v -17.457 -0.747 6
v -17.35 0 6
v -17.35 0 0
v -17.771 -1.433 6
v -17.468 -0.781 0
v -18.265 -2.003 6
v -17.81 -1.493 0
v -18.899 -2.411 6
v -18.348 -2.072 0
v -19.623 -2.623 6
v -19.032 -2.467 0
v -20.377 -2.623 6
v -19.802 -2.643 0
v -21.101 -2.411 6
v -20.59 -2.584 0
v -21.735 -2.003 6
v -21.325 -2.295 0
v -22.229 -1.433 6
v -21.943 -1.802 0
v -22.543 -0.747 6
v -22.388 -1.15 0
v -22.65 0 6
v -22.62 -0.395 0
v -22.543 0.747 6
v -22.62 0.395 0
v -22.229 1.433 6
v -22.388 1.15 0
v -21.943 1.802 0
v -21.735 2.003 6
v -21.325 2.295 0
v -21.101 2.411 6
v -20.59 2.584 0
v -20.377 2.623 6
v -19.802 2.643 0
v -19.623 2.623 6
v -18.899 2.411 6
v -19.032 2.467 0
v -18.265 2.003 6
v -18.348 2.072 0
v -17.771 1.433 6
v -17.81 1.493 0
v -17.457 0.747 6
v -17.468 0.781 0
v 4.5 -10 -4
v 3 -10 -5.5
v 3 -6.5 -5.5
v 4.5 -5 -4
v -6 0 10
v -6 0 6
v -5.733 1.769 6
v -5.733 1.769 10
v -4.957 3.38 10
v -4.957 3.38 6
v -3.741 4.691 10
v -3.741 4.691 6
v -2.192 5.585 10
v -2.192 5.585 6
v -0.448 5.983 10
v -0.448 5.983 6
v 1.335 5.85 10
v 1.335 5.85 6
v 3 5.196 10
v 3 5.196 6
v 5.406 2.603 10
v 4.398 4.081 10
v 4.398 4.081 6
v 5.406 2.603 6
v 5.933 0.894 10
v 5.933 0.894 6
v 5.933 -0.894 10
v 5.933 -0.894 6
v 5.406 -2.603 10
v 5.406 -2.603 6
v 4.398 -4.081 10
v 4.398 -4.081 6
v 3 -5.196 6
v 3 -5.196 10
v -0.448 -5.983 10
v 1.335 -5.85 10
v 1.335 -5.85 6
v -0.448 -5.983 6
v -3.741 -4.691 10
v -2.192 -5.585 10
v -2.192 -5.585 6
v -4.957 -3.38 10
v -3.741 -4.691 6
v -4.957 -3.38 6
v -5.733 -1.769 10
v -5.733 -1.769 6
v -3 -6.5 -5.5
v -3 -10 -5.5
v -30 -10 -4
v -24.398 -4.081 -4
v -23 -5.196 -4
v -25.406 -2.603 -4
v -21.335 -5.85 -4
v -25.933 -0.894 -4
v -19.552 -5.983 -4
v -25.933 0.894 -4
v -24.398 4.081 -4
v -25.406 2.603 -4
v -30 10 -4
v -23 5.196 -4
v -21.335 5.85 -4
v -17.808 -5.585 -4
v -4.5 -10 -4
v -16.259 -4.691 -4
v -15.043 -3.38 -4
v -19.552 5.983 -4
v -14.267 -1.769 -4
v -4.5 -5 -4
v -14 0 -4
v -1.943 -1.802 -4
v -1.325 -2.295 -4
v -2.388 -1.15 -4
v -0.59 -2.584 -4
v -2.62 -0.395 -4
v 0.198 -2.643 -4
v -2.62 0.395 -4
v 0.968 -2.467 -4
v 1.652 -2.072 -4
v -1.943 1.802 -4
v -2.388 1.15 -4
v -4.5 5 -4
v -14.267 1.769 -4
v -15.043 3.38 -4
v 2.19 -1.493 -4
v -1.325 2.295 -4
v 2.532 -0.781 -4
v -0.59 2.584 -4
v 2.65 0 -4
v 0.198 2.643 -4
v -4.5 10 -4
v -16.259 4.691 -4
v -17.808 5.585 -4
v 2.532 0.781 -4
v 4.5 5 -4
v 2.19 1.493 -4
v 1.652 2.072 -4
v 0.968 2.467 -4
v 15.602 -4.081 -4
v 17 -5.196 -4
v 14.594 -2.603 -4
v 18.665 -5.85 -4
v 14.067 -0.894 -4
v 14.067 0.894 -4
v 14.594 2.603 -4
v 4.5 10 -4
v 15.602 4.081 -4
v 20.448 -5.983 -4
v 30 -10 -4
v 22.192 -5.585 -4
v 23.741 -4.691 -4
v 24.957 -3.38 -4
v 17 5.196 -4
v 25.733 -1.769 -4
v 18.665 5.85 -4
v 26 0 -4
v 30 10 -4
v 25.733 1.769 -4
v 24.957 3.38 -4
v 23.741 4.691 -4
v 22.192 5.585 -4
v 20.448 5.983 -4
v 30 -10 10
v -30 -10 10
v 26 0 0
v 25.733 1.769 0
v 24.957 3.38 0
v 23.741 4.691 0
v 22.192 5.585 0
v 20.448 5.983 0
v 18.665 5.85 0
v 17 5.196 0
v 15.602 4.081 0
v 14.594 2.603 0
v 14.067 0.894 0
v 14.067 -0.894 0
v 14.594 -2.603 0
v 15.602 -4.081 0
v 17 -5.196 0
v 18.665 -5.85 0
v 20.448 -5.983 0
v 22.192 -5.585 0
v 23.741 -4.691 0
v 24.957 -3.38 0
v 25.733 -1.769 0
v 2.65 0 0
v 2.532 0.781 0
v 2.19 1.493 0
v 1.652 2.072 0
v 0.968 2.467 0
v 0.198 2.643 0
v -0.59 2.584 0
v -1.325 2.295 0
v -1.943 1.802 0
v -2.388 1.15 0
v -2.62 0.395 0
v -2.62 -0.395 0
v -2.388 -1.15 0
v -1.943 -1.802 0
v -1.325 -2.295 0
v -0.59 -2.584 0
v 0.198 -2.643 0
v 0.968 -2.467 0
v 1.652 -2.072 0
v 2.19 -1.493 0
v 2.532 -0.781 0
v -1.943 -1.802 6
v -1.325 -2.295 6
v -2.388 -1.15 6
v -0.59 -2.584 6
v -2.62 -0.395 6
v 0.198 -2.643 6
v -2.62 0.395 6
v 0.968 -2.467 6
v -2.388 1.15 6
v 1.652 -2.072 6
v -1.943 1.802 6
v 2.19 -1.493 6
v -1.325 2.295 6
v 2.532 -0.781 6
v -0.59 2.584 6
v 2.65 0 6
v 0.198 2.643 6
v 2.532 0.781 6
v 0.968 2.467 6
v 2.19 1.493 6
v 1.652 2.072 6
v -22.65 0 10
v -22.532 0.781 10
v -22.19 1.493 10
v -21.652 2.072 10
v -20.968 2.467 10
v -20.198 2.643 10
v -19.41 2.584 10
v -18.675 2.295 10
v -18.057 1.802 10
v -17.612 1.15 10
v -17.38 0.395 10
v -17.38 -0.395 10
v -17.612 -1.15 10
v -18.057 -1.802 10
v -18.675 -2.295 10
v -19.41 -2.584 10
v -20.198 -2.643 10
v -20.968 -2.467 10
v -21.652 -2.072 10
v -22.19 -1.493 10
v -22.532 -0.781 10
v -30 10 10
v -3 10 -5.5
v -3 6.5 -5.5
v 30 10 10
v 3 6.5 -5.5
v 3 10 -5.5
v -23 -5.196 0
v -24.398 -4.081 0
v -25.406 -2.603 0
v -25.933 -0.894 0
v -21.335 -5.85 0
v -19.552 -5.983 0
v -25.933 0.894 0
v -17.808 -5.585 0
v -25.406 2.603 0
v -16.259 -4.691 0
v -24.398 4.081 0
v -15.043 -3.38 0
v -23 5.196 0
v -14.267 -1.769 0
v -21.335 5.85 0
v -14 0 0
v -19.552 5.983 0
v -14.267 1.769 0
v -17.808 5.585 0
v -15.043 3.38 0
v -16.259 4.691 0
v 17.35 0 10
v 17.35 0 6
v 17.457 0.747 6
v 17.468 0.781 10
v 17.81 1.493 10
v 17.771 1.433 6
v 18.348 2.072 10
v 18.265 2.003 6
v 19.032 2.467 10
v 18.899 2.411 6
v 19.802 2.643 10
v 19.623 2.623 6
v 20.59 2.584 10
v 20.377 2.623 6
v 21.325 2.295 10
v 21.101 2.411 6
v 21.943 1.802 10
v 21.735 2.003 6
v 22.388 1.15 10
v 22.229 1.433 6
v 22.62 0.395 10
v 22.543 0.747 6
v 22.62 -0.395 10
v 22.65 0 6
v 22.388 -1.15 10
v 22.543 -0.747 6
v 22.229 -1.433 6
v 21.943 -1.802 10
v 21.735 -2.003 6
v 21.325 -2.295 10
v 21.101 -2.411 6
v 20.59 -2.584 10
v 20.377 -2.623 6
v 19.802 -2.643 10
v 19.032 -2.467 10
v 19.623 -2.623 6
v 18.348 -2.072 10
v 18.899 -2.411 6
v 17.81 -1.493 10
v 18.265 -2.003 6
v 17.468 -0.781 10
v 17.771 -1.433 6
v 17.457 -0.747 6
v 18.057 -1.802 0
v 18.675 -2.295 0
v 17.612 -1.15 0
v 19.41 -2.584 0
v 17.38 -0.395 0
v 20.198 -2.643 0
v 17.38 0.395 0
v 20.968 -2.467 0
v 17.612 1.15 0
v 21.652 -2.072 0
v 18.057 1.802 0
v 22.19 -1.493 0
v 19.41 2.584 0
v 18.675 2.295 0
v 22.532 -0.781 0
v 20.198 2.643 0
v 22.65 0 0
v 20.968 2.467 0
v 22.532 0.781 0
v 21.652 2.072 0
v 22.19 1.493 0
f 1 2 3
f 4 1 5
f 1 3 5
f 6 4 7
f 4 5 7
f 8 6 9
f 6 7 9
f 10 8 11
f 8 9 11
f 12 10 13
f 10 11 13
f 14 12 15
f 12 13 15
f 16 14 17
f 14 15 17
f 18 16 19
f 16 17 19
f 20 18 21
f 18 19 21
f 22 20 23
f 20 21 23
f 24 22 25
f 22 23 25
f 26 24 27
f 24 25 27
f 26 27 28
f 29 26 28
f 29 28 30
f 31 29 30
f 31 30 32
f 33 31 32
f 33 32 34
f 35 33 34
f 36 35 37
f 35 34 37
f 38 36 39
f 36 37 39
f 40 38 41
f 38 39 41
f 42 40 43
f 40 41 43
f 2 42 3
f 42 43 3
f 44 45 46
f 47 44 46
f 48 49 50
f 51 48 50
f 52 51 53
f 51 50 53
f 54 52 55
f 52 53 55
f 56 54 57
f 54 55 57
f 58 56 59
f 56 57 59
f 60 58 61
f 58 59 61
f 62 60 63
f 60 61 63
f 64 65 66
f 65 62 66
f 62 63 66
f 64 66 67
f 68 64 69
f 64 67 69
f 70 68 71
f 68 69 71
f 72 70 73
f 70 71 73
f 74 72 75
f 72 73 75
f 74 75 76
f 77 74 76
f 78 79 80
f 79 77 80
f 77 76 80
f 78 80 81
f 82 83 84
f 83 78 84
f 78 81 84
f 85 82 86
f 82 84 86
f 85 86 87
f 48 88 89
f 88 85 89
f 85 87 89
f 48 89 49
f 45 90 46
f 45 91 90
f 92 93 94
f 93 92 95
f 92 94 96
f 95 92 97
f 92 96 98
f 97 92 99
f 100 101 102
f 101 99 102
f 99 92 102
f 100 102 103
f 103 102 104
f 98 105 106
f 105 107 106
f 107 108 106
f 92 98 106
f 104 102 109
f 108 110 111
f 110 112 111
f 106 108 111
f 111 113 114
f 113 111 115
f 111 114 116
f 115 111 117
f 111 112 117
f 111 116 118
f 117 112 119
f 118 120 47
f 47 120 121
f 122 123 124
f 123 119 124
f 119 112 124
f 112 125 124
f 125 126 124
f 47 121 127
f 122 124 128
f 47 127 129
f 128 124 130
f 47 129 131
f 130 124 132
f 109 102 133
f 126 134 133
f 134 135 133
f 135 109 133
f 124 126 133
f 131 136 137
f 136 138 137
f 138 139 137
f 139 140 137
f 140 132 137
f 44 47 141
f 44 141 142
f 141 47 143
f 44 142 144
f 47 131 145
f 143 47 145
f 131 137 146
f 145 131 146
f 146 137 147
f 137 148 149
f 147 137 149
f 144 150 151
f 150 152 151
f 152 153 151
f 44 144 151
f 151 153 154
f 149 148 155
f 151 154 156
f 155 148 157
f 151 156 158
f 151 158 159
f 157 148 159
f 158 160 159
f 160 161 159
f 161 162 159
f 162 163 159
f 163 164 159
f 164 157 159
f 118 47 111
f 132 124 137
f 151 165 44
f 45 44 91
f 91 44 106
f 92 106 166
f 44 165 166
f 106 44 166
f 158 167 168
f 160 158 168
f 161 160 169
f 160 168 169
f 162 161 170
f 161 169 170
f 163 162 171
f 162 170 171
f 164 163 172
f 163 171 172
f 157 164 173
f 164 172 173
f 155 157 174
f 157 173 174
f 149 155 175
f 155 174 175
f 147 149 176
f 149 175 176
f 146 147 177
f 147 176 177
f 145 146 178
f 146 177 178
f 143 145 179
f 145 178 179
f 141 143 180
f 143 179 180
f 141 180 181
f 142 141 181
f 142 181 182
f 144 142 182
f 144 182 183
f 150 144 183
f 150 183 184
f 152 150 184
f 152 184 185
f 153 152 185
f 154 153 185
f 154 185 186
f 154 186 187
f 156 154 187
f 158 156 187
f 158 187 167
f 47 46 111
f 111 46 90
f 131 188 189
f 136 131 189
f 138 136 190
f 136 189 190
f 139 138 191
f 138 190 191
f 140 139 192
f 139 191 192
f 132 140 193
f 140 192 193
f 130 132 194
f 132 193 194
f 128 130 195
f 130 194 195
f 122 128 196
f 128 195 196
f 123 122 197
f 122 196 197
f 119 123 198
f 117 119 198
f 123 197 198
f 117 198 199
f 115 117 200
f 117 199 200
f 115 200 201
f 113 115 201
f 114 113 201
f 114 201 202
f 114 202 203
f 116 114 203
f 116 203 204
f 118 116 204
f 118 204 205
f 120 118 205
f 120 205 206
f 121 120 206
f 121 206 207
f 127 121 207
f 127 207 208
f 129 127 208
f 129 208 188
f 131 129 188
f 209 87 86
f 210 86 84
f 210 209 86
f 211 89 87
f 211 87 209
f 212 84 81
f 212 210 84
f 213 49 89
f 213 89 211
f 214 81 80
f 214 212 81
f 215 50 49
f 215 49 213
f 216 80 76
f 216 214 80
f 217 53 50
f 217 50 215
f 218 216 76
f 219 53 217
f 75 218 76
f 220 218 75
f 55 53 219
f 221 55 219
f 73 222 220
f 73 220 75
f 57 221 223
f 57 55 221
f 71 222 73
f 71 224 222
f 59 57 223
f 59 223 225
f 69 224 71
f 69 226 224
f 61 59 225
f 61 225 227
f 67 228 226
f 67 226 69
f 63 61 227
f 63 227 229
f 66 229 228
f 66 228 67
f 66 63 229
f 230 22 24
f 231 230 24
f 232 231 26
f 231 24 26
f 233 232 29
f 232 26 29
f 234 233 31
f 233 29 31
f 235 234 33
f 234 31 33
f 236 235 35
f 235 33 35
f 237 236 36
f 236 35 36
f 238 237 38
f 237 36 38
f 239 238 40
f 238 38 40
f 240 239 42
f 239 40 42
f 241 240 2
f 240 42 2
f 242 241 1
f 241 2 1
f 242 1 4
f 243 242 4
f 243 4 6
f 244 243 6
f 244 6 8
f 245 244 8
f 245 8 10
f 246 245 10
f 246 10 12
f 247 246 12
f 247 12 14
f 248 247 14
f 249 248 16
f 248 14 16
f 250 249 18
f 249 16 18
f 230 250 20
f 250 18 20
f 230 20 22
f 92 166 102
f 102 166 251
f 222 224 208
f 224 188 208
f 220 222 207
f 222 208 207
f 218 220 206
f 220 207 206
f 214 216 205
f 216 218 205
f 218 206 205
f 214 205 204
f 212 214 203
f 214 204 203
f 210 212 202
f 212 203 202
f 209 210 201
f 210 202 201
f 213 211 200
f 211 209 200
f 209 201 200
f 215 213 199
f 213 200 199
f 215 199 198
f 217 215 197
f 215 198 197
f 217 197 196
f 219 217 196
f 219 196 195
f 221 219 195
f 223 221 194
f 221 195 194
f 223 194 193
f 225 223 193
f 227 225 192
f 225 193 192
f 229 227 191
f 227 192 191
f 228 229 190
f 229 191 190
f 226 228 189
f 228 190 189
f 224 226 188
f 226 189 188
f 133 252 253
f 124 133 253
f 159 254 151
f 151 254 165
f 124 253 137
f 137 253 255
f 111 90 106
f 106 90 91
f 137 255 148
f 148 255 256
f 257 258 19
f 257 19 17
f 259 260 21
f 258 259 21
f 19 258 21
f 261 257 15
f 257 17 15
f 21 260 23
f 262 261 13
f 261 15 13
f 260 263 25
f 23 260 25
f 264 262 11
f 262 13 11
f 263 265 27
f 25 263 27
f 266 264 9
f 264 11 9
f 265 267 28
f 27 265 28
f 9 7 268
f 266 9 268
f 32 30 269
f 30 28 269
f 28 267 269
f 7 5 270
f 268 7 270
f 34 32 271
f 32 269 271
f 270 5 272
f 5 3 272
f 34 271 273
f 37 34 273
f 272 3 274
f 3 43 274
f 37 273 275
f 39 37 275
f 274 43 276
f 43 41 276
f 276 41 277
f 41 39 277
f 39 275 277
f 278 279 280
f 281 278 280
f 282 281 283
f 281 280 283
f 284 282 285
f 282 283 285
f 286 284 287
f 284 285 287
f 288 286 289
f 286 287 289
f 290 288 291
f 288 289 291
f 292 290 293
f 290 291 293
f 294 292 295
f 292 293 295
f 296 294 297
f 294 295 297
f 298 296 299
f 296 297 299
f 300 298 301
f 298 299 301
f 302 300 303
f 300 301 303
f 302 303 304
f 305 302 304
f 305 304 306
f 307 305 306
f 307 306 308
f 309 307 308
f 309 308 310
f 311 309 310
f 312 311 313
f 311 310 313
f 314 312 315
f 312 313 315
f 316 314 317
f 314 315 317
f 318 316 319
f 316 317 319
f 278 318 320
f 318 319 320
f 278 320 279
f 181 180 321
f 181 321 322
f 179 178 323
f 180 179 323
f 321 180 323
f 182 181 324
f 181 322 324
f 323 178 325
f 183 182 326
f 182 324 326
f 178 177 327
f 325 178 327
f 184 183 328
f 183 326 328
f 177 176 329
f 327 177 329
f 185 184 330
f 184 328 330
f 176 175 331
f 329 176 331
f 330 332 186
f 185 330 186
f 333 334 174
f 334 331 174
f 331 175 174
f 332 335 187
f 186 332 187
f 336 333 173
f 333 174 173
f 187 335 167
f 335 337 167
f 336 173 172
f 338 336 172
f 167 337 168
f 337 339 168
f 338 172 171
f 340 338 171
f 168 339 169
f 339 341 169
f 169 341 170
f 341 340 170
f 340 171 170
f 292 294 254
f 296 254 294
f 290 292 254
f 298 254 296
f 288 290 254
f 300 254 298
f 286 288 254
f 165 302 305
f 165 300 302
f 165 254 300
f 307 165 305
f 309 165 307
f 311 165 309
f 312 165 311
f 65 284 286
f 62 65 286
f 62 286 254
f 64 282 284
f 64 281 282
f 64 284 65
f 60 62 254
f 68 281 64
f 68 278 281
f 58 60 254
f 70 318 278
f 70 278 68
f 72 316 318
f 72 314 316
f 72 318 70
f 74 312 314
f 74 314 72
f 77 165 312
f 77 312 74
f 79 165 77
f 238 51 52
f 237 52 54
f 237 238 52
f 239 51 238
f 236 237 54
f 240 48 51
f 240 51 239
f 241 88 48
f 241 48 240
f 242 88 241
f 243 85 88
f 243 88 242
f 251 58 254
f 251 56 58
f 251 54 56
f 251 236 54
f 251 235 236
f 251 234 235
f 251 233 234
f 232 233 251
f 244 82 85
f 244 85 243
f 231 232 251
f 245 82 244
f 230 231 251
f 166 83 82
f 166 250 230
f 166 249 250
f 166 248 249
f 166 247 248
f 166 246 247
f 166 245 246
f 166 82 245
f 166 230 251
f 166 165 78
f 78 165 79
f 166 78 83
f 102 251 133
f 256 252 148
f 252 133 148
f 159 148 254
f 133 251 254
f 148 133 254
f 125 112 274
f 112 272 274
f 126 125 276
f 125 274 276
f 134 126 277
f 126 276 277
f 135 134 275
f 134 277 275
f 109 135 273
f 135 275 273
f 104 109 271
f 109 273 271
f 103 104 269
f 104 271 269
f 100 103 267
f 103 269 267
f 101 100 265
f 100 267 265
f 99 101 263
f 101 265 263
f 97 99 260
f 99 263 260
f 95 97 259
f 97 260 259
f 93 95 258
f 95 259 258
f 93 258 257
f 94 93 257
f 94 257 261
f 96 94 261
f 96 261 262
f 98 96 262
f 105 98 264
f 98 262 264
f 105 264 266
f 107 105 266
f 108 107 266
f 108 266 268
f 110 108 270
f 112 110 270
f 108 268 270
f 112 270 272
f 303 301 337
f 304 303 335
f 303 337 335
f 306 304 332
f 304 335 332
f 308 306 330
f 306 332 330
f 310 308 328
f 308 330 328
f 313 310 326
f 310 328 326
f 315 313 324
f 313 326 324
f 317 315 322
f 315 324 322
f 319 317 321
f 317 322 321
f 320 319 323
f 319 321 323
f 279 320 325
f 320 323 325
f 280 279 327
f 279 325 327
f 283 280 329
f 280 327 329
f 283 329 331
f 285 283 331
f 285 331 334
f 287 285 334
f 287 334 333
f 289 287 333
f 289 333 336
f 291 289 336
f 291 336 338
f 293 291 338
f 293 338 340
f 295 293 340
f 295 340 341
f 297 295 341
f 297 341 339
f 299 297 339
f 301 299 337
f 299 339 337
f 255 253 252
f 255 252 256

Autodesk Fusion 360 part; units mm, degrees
sketch "Sketch1" plane through (0, 0, 0) normal (0, 0, 1) x (1, 0, 0)
  line L0 (30, -10) -> (-30, -10)
  line L1 (-30, -10) -> (-30, 10)
  line L2 (-30, 10) -> (30, 10)
  line L3 (30, 10) -> (30, -10)
  line L4 (30, -10) -> (-30, 10) construction
  line L5 (-30, -10) -> (30, 10) construction
  circle A0 centre (0, 0) radius 2.65
  circle A1 centre (20, 0) radius 2.65
  circle A2 centre (-20, 0) radius 2.65
  circle A3 centre (-20, 0) radius 6
  circle A4 centre (20, 0) radius 6
  dimension "d1" = 60
  dimension "d2" = 20
  dimension "d3" = 5.3
  dimension "d4" = 5.3
  dimension "d5" = 5.3
  dimension "d11" = 12
  dimension "d12" = 12
extrude "Extrude1" add sketch "Sketch1" along normal blind 6 contours L0 L1 L2 L3 | A3 | A4
sketch "Sketch2" plane through (0, 0, 6) normal (0, 0, 1) x (-1, 0, 0)
  circle A0 centre (0, 0) radius 2.65
  circle A1 centre (-20, 0) radius 2.65
  circle A2 centre (20, 0) radius 2.65
  line L0 (-30, -10) -> (30, -10)
  line L1 (30, -10) -> (30, 10)
  line L2 (30, 10) -> (-30, 10)
  line L3 (-30, 10) -> (-30, -10)
  circle A3 centre (0, 0) radius 6
  dimension "d8" = 12
extrude "Extrude2" add sketch "Sketch2" along normal blind 4 contours L0 L1 L2 L3
extrude "Extrude4" add sketch "Sketch1" against normal blind 4 contours L0 L1 L2 L3
sketch "Sketch3" plane through (0, 0, -4) normal (0, 0, -1) x (1, 0, 0)
  circle A0 centre (0, 0) radius 2.65
  circle A1 centre (20, 0) radius 6
  circle A2 centre (-20, 0) radius 6
  line L0 (-30, -10) -> (30, -10)
  line L1 (30, -10) -> (30, 10)
  line L2 (30, 10) -> (-30, 10)
  line L3 (-30, 10) -> (-30, -10)
  line L4 (-4.5, 5) -> (4.5, 5)
  line L5 (4.5, 5) -> (4.5, 10)
  line L6 (4.5, 10) -> (-4.5, 10)
  line L7 (-4.5, 10) -> (-4.5, 5)
  line L8 (-4.5, -10) -> (4.5, -10)
  line L9 (4.5, -10) -> (4.5, -5)
  line L10 (4.5, -5) -> (-4.5, -5)
  line L11 (-4.5, -5) -> (-4.5, -10)
  dimension "d17" = 9
  dimension "d18" = 5
  dimension "d19" = 9
  dimension "d20" = 5
extrude "Extrude5" add sketch "Sketch3" along normal blind 1.5 contours L0 L8 L9 L10 L11 | L2 L4 L5 L6 L7
chamfer "Chamfer1" distance 1.5 angle 45 6 edges at (-4.5, -7.5, -5.5) (0, -5, -5.5) (4.5, -7.5, -5.5) (-4.5, 7.5, -5.5) (0, 5, -5.5) (4.5, 7.5, -5.5)
extrude "Extrude3" [suppressed]
